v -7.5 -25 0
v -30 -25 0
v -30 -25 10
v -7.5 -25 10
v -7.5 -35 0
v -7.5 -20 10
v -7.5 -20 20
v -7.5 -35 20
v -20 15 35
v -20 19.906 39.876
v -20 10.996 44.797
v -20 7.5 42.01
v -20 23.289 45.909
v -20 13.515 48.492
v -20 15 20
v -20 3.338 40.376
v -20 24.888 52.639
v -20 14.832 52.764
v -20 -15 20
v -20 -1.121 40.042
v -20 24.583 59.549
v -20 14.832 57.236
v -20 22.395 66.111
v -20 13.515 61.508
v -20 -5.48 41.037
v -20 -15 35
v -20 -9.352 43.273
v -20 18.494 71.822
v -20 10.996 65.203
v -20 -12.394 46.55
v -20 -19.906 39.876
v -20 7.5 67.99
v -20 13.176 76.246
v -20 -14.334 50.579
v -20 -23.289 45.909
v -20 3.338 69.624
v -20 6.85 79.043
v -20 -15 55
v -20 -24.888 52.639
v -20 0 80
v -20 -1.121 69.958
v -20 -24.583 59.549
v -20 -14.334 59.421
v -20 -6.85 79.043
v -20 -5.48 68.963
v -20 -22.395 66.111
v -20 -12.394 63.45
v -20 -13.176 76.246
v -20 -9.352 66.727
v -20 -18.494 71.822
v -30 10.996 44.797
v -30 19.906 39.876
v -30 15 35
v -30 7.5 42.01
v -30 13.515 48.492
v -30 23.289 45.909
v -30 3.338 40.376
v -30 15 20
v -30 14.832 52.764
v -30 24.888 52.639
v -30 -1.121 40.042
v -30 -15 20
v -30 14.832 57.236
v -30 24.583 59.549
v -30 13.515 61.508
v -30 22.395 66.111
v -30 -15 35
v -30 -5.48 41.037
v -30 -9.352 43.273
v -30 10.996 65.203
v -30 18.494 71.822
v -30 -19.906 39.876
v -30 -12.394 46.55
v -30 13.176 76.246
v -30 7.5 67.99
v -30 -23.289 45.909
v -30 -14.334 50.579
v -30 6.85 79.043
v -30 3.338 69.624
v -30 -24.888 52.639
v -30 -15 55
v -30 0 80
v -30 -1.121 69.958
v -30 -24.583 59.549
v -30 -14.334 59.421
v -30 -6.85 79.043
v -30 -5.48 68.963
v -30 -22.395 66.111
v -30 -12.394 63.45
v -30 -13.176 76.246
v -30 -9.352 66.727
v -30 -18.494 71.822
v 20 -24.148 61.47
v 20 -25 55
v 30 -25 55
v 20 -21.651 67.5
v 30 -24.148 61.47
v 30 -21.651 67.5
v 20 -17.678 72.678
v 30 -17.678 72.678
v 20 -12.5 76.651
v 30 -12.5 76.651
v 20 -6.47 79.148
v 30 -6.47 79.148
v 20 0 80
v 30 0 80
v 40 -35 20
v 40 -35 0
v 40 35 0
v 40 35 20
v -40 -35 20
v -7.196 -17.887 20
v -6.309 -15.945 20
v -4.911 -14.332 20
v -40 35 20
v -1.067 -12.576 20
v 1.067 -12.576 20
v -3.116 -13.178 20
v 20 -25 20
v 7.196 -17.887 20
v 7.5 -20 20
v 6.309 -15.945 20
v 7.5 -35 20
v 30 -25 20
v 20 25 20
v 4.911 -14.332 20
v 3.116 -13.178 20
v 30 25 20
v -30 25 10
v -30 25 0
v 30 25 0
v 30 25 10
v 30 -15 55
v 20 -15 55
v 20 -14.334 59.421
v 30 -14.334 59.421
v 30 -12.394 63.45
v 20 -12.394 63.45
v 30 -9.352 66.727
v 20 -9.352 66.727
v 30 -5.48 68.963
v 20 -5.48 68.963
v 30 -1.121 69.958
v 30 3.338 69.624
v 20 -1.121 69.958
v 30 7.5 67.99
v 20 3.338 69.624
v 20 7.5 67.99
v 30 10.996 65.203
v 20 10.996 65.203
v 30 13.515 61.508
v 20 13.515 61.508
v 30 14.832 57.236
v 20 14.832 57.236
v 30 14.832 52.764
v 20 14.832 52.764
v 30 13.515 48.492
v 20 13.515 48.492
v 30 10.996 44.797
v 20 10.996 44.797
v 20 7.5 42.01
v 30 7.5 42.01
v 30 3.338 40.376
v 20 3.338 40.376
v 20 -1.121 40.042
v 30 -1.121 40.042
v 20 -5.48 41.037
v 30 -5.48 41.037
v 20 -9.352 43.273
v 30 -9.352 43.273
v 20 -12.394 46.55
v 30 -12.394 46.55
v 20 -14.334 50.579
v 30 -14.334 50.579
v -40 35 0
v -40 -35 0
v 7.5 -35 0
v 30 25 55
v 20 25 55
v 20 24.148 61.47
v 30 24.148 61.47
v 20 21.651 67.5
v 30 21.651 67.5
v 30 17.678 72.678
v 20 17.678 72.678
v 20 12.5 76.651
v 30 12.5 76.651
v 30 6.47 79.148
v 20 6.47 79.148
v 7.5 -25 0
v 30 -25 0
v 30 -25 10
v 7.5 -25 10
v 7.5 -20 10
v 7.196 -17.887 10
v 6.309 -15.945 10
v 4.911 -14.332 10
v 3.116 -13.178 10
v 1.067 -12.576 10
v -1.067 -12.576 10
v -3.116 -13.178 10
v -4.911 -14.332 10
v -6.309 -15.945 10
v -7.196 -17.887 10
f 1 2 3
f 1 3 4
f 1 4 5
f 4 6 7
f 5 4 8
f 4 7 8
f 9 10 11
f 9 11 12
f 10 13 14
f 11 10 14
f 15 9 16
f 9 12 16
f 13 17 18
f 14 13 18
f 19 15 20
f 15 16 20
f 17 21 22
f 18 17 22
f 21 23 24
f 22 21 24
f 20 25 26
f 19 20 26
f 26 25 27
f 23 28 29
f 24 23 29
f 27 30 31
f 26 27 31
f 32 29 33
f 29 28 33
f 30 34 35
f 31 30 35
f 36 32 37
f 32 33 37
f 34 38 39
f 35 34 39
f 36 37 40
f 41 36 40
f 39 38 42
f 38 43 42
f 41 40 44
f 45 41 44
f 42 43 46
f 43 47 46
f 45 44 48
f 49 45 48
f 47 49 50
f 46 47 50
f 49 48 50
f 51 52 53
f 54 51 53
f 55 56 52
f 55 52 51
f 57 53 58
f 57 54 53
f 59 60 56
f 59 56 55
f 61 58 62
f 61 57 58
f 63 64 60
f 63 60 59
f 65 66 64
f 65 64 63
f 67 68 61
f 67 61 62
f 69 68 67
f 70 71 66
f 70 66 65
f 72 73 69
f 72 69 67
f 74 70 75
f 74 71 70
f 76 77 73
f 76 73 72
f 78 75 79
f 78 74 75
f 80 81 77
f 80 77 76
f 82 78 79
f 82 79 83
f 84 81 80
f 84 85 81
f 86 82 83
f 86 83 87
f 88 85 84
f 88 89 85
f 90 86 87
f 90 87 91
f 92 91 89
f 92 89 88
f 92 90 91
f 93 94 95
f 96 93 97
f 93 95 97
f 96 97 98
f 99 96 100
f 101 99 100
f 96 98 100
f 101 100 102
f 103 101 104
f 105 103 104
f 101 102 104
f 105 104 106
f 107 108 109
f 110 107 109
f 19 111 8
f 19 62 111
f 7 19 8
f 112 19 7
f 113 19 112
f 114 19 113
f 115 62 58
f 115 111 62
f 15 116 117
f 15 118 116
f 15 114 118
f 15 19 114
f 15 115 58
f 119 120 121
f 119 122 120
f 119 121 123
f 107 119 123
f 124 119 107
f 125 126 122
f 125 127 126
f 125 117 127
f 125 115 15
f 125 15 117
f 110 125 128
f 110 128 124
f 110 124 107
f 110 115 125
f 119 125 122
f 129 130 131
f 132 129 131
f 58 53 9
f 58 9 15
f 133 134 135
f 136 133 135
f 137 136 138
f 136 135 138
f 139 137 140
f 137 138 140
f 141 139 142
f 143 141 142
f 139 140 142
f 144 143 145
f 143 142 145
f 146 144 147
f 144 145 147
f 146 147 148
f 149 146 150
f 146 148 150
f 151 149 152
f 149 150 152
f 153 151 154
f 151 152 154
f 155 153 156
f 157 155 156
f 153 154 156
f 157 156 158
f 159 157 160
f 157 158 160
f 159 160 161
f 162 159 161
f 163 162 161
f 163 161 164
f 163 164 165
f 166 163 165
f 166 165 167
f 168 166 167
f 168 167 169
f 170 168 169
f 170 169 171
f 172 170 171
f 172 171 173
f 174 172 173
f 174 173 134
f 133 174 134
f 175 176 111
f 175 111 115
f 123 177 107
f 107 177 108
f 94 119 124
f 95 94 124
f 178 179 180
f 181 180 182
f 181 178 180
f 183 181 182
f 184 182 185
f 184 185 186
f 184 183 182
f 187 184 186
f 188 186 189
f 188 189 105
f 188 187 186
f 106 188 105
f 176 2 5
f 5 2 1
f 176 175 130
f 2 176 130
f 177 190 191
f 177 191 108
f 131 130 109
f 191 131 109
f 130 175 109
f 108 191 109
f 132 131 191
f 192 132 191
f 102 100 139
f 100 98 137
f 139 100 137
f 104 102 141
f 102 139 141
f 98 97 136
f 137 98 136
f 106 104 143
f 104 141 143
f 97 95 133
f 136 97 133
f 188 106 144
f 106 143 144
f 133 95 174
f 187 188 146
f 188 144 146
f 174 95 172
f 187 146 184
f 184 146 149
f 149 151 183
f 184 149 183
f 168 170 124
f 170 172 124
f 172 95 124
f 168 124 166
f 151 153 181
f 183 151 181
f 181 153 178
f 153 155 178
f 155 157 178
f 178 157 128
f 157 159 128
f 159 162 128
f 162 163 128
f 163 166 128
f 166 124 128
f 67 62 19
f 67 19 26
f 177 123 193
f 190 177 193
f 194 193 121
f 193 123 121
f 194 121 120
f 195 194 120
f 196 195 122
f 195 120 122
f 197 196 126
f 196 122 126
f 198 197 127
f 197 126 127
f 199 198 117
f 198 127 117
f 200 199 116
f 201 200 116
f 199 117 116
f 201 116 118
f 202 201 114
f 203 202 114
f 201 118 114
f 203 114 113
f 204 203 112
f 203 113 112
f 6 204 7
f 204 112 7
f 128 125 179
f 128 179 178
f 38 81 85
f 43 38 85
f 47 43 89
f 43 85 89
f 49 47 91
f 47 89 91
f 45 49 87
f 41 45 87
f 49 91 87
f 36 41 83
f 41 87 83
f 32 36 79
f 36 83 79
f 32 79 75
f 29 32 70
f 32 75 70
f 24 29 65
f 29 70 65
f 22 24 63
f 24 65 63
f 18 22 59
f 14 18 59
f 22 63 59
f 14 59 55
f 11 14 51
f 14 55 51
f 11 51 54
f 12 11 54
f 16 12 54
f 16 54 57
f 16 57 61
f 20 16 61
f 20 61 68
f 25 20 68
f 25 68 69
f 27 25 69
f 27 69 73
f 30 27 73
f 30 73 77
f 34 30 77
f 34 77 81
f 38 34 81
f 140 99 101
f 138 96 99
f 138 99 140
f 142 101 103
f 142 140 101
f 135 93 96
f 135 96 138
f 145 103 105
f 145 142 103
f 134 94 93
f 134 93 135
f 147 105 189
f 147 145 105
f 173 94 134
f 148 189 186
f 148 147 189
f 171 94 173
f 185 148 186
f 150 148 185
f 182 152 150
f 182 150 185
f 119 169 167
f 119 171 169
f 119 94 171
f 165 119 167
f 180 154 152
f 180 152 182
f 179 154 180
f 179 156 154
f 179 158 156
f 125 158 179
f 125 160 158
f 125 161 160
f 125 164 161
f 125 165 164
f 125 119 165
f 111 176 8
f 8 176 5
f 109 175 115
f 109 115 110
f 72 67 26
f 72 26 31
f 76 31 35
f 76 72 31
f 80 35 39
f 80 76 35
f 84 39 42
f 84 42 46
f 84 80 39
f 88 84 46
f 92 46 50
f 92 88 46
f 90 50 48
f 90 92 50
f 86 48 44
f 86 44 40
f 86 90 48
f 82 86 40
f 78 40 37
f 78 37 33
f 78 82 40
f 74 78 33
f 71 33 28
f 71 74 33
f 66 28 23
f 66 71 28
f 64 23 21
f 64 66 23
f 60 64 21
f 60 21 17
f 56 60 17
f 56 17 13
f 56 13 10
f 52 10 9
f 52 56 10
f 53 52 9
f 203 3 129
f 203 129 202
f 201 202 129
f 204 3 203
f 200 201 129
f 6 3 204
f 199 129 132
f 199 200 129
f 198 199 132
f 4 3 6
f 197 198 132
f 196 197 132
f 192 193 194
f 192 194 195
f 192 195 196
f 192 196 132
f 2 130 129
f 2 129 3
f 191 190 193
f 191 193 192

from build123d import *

# Parameters (mm, degrees)
F0_W      = 80
F0_H      = 70
F1_DEPTH  = 20
F2_W      = 60
F2_H      = 50
F3_DEPTH  = 10
F5_DEPTH  = 20.001
F6_W      = 10
F6_H      = 50
F7_DEPTH  = 60
F8_R      = 24.99999
F11_DEPTH = 10
F12_R     = 15
F13_DEPTH = 70.001


# Not quite as in the source:
# - a fillet or chamfer is up to 0.001 mm smaller than in the source, because OpenCascade refuses the exact size


with BuildPart() as f1:
    # F0 (on Top) → F1 (new body)
    with BuildSketch(Plane.XY):
        Rectangle(F0_W, F0_H)
    extrude(amount=F1_DEPTH)

    # F2 (on face) → F3 (cut)
    with BuildSketch(Plane(origin=(0, 0, 0), x_dir=(1, 0, 0), z_dir=(0, 0, -1))):
        Rectangle(F2_W, F2_H)
    extrude(amount=-F3_DEPTH, mode=Mode.SUBTRACT)

    # F4 (on face) → F5 (cut, through all)
    with BuildSketch(Plane.XY.offset(20)):
        with BuildLine():
            Line((7.5, -35), (7.5, -20))
            ThreePointArc((7.5, -20), (0, -12.5), (-7.5, -20))
            Line((-7.5, -20), (-7.5, -35))
            Line((-7.5, -35), (7.5, -35))
        make_face()
    extrude(amount=-F5_DEPTH, mode=Mode.SUBTRACT)

    # F6 (on face) → F7 (join)
    with BuildSketch(Plane.XY.offset(20)):
        with Locations((25, 0)):
            Rectangle(F6_W, F6_H)
    extrude(amount=F7_DEPTH)

    # F8 (radius 25 in the source; OpenCascade refuses exactly that, so slightly less here)
    f8_edges = [f1.edges().sort_by_distance(p)[0] for p in [
        (25, -25, 80),
        (25, 25, 80),
    ]]
    fillet(f8_edges, radius=F8_R)

    # F10 (on offset) → F11 (join)
    with BuildSketch(Plane(origin=(-30, 0, 0), x_dir=(0, -1, 0), z_dir=(-1, 0, 0))):
        with BuildLine():
            Line((15, 20), (15, 35))
            ThreePointArc((15, 35), (0, 80), (-15, 35))
            Line((-15, 35), (-15, 20))
            Line((-15, 20), (15, 20))
        make_face()
    extrude(amount=-F11_DEPTH)

    # F12 (on face) → F13 (cut, through all)
    with BuildSketch(Plane(origin=(-30, 0, 0), x_dir=(0, -1, 0), z_dir=(-1, 0, 0))):
        with Locations((0, 55)):
            Circle(F12_R)
    extrude(amount=-F13_DEPTH, mode=Mode.SUBTRACT)


solid = f1.part
